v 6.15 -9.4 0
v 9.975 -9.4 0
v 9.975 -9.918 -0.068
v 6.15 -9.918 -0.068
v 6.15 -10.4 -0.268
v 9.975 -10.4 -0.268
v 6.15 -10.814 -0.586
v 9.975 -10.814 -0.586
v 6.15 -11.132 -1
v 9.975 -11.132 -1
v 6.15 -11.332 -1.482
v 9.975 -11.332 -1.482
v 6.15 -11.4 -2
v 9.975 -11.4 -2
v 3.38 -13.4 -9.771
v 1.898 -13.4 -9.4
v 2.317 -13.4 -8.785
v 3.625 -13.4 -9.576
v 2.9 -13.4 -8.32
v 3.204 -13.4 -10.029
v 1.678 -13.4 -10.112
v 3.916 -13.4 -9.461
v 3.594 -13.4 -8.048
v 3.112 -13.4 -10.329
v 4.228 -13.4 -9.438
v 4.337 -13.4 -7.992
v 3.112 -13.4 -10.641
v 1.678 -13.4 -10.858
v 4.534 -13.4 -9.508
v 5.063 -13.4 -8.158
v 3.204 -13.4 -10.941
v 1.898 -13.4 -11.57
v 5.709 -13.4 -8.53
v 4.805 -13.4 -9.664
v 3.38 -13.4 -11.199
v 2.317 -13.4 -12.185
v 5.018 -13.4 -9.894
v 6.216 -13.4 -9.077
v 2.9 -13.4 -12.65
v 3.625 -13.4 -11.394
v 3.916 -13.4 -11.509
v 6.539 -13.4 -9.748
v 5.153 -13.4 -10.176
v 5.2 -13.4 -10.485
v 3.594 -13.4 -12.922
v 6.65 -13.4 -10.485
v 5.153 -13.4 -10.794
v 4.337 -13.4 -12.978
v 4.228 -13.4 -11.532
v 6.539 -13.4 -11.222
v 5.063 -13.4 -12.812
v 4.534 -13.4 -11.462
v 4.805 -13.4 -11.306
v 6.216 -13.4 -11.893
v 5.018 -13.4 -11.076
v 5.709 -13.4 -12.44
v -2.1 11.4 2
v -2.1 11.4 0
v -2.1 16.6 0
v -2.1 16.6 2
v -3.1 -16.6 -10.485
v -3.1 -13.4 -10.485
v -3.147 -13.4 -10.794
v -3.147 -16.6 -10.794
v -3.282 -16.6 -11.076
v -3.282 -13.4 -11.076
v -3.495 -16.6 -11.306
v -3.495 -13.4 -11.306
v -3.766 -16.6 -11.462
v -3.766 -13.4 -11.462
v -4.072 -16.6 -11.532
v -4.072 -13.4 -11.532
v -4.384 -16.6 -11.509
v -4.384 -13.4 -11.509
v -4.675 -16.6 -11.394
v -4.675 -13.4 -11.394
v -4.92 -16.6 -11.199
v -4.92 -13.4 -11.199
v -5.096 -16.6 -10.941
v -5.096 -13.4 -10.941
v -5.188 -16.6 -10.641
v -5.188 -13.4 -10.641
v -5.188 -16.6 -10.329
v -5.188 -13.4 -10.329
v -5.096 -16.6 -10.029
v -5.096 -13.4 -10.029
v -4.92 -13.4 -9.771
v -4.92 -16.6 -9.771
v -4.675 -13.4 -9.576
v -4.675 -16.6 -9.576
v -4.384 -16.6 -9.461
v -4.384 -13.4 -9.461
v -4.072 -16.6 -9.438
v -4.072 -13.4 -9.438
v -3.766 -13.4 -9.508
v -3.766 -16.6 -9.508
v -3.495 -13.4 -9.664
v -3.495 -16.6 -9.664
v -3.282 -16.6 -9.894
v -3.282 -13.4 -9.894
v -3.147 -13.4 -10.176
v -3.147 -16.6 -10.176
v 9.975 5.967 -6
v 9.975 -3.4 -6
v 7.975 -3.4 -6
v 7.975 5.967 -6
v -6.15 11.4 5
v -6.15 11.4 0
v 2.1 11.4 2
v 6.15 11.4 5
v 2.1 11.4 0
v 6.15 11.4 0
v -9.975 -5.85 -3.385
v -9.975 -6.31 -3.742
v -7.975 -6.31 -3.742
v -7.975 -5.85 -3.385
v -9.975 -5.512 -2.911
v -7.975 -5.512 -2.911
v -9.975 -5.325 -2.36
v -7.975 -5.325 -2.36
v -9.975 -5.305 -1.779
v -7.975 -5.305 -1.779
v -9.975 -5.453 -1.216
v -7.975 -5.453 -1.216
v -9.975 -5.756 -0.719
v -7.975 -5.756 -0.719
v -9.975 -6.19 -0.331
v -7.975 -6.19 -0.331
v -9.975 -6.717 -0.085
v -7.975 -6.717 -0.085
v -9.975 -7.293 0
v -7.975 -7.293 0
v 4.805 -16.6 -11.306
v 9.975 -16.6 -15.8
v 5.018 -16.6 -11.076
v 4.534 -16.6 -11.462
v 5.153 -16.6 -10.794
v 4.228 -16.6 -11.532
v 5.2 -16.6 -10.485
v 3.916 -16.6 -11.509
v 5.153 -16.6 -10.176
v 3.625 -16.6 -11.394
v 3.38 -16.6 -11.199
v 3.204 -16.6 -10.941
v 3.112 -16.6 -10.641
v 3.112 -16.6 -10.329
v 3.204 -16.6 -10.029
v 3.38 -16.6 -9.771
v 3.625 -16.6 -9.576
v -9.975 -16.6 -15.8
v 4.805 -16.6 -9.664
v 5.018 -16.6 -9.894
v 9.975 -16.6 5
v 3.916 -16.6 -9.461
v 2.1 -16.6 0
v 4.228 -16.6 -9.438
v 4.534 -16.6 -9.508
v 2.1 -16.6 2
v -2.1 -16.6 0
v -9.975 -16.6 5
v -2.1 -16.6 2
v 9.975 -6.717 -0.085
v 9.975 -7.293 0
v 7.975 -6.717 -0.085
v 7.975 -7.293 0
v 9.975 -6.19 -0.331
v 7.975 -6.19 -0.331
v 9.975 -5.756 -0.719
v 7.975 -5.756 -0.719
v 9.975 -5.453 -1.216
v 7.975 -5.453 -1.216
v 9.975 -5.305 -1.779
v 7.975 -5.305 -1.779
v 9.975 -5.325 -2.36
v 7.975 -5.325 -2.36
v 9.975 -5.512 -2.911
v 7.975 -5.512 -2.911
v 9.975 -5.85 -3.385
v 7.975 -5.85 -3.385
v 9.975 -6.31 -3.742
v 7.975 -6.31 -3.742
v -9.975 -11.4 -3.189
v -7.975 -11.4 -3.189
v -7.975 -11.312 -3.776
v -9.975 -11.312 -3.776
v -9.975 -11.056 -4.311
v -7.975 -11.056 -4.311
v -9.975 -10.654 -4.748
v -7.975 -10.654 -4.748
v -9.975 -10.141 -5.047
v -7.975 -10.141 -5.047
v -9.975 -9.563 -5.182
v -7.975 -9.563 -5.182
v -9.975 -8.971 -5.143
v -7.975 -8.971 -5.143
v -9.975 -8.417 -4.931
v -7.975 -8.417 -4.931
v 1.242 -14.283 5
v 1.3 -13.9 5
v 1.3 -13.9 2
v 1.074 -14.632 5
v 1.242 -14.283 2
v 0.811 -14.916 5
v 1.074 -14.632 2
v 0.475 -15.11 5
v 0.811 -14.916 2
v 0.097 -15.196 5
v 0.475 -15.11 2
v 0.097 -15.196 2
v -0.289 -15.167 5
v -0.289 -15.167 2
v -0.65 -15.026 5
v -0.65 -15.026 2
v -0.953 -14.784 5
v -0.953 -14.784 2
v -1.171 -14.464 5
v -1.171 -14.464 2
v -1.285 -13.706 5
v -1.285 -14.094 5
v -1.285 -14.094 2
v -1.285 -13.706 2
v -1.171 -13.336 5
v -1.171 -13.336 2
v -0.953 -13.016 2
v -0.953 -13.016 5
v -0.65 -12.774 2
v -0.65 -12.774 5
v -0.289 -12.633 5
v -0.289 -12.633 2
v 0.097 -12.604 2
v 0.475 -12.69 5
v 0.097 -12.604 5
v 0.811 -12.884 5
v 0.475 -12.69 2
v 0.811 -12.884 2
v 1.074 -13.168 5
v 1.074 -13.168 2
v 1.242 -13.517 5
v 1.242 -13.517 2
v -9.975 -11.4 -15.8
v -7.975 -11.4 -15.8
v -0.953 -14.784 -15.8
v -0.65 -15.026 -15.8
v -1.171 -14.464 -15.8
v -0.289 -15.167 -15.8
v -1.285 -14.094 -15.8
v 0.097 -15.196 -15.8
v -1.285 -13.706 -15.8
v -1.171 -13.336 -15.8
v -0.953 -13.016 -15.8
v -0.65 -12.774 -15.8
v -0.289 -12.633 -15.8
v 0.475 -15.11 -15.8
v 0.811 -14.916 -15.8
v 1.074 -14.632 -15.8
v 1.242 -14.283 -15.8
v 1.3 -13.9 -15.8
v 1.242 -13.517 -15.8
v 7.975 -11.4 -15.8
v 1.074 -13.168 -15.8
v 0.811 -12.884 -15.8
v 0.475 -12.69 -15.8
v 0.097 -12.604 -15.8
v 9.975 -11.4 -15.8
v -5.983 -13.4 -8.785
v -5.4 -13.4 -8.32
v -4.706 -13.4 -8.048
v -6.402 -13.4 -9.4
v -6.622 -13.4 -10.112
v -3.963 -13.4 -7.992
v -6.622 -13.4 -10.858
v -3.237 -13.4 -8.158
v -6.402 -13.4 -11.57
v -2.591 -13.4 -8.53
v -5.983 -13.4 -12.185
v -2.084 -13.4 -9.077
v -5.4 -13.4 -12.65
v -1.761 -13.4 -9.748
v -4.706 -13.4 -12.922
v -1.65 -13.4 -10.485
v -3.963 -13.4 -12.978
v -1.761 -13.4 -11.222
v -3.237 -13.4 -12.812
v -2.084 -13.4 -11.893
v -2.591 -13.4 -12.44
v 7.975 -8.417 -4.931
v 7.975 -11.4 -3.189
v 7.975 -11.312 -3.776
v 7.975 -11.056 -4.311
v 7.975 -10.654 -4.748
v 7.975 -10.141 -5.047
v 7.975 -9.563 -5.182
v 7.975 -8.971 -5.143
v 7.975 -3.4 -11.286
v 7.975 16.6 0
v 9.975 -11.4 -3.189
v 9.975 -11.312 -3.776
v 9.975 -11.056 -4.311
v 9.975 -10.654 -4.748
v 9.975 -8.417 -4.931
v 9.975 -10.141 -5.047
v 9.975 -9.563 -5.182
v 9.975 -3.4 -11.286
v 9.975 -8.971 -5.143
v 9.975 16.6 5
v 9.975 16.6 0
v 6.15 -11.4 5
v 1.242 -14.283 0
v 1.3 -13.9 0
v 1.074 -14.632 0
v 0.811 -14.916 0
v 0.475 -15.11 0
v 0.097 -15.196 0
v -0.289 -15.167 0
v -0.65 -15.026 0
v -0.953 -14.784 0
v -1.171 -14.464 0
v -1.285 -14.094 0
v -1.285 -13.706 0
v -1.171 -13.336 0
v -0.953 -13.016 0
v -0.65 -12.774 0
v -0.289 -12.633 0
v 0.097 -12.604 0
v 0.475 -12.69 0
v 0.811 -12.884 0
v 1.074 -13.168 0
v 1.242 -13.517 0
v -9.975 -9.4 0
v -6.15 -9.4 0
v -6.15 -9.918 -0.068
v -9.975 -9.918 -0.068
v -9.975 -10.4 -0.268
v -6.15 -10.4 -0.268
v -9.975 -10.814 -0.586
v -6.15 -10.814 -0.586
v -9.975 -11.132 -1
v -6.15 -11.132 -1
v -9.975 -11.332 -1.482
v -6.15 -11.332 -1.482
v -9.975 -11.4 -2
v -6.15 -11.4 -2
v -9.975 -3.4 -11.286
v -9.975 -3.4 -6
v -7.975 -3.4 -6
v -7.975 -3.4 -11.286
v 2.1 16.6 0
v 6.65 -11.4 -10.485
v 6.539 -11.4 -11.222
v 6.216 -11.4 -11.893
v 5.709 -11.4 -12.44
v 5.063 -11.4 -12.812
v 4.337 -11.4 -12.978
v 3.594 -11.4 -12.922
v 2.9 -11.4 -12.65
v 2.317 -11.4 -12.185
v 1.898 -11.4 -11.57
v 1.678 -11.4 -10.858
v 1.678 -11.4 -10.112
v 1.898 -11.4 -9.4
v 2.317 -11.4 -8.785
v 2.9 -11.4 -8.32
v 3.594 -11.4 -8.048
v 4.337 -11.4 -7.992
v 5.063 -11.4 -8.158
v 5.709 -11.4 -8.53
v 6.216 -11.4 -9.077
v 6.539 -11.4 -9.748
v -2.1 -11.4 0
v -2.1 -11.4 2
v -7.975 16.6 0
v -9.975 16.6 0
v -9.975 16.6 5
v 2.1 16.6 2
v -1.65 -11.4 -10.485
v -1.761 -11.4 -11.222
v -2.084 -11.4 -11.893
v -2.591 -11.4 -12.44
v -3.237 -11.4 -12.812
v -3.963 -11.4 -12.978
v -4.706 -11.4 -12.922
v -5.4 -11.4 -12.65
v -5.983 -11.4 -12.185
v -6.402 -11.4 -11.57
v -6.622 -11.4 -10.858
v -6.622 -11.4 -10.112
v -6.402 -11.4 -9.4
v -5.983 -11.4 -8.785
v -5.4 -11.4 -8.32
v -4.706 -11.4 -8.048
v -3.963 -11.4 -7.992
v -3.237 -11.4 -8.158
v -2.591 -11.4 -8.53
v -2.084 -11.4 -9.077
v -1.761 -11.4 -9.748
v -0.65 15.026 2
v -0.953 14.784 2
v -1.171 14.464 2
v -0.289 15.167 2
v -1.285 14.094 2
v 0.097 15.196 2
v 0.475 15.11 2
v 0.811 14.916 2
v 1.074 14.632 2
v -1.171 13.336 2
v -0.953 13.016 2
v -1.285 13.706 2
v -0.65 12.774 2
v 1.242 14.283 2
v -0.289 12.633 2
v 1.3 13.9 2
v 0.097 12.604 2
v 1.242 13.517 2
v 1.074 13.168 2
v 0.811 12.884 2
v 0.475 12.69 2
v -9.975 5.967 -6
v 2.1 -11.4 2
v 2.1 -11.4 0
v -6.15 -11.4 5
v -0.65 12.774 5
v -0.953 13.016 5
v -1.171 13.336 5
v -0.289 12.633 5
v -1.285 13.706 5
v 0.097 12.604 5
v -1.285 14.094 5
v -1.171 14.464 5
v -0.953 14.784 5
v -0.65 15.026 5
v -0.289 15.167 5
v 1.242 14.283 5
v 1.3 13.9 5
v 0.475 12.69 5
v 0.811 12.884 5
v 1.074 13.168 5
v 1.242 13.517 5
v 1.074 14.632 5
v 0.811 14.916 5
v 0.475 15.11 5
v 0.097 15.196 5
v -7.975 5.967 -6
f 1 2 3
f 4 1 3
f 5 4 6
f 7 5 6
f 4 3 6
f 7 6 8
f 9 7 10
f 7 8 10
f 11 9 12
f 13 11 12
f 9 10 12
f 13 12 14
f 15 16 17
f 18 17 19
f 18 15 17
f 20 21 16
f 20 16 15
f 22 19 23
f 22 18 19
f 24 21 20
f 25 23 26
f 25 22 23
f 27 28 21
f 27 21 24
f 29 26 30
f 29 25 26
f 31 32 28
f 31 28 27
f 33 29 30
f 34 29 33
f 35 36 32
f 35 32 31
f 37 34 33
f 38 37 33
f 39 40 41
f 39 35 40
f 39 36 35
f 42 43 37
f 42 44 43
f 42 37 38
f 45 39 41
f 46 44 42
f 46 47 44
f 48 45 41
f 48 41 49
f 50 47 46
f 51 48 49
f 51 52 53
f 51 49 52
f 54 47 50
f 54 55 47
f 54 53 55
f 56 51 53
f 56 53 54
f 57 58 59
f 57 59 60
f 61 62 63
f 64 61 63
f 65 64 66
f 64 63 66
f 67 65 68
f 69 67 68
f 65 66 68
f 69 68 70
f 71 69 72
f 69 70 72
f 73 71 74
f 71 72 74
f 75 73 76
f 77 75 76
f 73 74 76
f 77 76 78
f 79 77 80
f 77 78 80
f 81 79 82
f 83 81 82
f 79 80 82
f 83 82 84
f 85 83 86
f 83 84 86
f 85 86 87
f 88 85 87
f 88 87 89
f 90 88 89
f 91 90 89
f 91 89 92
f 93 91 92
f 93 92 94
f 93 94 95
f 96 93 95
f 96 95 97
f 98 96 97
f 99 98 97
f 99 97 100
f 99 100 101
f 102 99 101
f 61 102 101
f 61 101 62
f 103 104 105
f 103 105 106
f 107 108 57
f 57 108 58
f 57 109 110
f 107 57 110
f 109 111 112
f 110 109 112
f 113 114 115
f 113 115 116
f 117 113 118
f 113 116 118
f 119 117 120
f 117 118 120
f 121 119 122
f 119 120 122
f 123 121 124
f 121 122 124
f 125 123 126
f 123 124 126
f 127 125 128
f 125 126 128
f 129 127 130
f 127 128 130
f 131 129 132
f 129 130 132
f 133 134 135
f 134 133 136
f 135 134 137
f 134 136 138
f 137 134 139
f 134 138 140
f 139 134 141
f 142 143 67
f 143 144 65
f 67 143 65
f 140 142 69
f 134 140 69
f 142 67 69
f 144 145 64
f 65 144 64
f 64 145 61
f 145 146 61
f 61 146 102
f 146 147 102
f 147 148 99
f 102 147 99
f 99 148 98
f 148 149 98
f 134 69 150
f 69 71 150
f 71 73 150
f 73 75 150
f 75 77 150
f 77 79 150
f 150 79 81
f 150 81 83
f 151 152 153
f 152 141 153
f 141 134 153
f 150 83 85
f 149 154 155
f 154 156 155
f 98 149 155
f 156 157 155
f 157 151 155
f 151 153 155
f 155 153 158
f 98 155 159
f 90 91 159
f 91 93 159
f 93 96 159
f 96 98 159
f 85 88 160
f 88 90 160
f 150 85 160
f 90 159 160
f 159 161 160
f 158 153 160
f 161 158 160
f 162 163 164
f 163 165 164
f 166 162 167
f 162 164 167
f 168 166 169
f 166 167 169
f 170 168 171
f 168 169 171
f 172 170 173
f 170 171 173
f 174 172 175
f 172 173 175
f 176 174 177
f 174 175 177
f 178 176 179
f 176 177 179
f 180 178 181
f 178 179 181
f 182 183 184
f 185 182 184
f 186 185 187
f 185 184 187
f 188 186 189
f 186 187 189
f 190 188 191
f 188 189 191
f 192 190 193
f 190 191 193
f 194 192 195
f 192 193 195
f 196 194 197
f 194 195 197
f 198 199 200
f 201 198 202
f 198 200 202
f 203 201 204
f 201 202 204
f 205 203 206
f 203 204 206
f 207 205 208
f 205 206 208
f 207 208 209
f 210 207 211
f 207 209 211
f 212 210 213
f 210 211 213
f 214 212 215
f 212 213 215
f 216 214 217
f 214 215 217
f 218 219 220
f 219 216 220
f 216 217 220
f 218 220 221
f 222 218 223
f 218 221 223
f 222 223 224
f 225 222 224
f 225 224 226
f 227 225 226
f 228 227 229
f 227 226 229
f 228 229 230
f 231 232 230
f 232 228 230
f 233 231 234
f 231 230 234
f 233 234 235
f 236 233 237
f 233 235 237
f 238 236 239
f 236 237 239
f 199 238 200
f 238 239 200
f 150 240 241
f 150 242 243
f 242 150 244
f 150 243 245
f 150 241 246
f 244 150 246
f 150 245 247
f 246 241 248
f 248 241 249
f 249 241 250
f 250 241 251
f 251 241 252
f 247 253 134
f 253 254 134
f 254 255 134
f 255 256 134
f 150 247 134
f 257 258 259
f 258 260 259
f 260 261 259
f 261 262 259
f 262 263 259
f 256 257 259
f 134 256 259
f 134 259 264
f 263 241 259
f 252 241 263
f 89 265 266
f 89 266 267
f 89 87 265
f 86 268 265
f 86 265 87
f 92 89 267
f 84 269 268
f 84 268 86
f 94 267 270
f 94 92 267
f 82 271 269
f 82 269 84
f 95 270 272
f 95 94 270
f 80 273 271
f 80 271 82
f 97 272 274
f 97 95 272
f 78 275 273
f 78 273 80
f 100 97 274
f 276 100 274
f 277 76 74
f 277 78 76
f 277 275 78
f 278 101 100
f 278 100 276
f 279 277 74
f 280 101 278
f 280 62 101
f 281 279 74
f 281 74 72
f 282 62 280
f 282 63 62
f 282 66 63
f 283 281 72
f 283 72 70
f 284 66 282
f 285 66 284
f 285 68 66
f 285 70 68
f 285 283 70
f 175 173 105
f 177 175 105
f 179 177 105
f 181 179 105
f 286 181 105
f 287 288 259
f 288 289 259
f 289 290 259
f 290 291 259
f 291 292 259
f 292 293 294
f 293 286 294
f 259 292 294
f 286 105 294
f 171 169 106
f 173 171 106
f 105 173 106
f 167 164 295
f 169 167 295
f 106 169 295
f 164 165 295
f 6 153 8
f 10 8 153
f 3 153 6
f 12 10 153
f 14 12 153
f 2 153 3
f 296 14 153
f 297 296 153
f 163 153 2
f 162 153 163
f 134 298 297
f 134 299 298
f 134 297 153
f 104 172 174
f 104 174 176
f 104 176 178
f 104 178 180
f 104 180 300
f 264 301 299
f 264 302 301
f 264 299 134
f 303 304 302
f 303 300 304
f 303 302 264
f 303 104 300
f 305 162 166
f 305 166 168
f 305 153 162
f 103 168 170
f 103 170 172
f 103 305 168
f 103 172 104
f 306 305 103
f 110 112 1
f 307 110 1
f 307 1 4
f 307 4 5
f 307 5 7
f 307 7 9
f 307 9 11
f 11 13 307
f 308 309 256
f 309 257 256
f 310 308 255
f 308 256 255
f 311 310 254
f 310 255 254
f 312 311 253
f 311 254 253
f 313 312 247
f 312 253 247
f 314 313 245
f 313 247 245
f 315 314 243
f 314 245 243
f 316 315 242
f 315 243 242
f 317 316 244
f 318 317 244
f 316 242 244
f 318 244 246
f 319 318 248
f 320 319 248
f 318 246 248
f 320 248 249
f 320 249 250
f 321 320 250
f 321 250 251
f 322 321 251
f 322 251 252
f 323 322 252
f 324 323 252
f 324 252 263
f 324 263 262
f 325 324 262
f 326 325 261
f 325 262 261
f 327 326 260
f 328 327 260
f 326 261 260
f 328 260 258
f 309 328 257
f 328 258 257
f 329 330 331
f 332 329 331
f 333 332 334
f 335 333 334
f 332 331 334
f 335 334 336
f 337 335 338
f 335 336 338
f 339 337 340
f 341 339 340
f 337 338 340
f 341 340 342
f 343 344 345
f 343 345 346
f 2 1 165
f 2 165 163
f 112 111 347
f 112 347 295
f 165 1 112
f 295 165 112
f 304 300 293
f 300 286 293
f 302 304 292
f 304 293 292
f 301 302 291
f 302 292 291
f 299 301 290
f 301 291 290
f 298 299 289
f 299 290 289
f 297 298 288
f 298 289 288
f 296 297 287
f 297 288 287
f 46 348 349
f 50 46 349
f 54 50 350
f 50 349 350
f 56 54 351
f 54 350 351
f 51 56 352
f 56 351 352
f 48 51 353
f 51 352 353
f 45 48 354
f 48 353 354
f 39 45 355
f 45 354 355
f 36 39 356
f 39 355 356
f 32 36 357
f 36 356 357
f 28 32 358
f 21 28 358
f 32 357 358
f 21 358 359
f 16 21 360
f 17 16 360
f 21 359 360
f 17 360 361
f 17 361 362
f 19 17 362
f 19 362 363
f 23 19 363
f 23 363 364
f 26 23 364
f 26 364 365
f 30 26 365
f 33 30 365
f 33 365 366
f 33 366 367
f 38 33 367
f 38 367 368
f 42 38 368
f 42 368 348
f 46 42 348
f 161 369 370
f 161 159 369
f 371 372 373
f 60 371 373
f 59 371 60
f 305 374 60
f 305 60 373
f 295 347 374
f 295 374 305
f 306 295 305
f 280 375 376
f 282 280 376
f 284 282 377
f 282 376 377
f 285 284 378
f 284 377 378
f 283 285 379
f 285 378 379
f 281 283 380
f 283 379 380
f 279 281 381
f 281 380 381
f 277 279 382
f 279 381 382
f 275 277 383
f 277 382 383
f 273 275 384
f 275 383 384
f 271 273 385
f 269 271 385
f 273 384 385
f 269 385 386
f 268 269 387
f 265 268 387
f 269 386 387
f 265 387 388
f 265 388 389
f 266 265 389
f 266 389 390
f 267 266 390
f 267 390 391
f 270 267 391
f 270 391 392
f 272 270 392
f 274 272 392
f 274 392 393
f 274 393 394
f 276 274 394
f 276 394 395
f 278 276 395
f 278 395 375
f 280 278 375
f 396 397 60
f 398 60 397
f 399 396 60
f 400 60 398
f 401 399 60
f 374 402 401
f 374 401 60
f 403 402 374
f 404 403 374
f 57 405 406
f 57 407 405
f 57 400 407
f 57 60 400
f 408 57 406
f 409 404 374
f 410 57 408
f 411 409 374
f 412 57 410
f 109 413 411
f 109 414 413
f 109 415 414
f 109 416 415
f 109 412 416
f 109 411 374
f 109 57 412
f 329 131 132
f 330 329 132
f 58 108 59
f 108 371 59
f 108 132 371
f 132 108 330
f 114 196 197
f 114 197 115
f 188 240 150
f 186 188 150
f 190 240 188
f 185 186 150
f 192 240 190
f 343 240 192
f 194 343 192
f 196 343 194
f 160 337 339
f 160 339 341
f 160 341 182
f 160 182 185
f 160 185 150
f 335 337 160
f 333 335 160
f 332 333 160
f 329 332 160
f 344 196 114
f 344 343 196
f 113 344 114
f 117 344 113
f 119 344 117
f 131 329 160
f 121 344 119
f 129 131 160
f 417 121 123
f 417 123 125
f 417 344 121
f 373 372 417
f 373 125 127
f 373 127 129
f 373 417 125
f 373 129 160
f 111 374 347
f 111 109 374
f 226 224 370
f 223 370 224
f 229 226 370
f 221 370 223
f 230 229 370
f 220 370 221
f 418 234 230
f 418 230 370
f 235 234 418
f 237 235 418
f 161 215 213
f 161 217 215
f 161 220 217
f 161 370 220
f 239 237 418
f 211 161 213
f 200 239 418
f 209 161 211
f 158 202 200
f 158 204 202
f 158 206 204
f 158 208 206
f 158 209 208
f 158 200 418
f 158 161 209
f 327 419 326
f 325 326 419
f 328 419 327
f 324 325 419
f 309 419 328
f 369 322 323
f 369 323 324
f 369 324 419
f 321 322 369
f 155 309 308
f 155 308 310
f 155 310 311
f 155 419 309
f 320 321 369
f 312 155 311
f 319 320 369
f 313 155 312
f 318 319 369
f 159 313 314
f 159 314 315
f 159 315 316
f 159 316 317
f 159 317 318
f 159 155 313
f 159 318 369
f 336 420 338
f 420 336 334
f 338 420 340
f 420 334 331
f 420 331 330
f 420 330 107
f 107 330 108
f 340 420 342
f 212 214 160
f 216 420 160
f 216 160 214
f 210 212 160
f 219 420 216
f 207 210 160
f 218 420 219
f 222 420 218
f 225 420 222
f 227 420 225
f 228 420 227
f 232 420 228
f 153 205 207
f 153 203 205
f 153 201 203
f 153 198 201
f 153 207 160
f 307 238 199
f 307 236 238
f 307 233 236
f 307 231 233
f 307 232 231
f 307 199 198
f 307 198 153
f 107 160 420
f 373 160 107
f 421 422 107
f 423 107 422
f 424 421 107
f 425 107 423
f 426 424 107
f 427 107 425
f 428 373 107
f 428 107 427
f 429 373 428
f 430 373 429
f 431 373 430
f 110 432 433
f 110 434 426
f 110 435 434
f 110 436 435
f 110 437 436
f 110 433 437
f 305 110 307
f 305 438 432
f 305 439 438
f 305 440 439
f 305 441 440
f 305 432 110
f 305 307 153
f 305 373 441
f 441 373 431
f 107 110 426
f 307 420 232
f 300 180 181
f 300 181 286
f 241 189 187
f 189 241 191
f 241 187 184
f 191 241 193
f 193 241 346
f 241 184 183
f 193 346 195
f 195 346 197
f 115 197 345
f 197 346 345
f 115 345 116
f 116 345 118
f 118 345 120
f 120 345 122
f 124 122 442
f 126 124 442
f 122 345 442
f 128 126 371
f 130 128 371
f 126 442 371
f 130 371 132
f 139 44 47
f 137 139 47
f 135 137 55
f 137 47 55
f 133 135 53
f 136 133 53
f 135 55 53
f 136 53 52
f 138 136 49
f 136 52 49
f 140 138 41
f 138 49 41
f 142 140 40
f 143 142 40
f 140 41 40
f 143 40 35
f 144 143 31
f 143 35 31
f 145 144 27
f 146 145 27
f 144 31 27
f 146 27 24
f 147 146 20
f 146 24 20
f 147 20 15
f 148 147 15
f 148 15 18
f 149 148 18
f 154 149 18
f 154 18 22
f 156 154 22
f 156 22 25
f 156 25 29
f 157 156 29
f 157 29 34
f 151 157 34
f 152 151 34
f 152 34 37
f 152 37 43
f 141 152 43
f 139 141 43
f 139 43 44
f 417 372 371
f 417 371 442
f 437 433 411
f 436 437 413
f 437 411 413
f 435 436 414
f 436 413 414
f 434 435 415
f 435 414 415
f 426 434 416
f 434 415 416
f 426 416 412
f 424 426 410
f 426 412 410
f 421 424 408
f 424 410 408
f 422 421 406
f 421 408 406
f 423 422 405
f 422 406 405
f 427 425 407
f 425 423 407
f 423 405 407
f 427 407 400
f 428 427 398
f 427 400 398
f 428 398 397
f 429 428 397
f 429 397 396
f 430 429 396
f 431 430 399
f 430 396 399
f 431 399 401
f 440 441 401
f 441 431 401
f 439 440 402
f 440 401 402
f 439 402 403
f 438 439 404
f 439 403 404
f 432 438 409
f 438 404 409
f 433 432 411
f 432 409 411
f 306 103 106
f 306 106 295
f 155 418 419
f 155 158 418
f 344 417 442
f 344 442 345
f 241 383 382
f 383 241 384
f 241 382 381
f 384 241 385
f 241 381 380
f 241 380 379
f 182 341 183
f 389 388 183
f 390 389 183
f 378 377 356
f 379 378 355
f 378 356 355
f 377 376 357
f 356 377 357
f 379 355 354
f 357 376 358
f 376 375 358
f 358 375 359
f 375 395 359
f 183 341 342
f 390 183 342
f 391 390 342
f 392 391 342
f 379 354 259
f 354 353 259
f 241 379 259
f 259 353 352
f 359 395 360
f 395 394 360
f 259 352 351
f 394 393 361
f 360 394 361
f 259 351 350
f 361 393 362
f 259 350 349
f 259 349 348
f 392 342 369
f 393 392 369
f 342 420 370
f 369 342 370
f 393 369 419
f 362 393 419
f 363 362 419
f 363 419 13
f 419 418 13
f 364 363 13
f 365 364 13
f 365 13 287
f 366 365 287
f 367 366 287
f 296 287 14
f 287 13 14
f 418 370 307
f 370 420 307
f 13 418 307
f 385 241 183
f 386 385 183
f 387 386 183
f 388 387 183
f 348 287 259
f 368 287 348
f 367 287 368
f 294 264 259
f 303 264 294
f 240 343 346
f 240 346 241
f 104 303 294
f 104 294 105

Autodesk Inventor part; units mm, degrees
ref_plane "YZ Plane" through (0, 0, 0) normal (1, 0, 0) x (0, 1, 0)
sketch "Sketch1" plane through (0, 0, 0) normal (0, 0, 1) x (1, 0, 0)
  line L0 (-9.975, 16.6) -> (9.975, 16.6)
  line L1 (9.975, 16.6) -> (9.975, -16.6)
  line L2 (9.975, -16.6) -> (-9.975, -16.6)
  line L3 (-9.975, -16.6) -> (-9.975, 16.6)
  line L4 (0, 0) -> (0, 11.4) construction
  line L5 (0, 0) -> (15.5803, 0) construction
  line L6 (-6.15, 11.4) -> (6.15, 11.4)
  line L7 (6.15, 11.4) -> (6.15, -11.4)
  line L8 (6.15, -11.4) -> (-6.15, -11.4)
  line L9 (-6.15, -11.4) -> (-6.15, 11.4)
  circle A0 centre (0, 13.9) radius 1.3
  circle A1 centre (0, -13.9) radius 1.3
  line L10 (-15.0861, 0) -> (20.6914, 0) projected
  line L11 (9.975, -16.6) -> (-9.975, -16.6)
  line L12 (-9.975, -16.6) -> (-9.975, -11.4)
  line L13 (-9.975, -11.4) -> (9.975, -11.4)
  line L14 (9.975, -11.4) -> (9.975, -16.6)
  line L15 (0, 11.4) -> (0, 13.9) construction
  point P0 (0, 16.6)
  dimension "d0" = 2.6
  dimension "d1" = 27.8
  dimension "d4" = 12.3
  dimension "d5" = 2.5
  dimension "d6" = 2.5
  dimension "d7" = 22.8
  dimension "d11" = 2.7
  dimension "d12" = 2.7
  dimension "d14" = 3.825
extrude "Extrusion1" add sketch "Sketch1" along normal blind 5 contours L0 L1 L10 L7 L6 L9 L3 | L10 L9 L13 L3 | L1 L13 L7 L10 | L13 L8 L1 L2 L3
extrude "Extrusion2" add sketch "Sketch1" against normal blind 15.8 contours L13 L8 L1 L2 L3
sketch "Sketch2" plane through (-6.15, -11.4, 5) normal (0, 1, 0) x (1, 0, 0)
  circle A0 centre (10.3, 15.485) radius 1.05
  circle A1 centre (2, 15.485) radius 1.05
  line L0 (-3.825, 20.8) -> (16.125, 20.8) projected
  line L1 (-3.825, 5) -> (-3.825, 20.8) projected
  line L2 (2, 15.485) -> (10.3, 15.485) construction
  line L3 (10.3, 15.485) -> (6.15, 15.485) construction
  line L4 (6.15, 15.485) -> (6.15, 20.8) construction
  point P0 (6.15, 5)
  dimension "d19" = 2.1
  dimension "d20" = 0
  dimension "d21" = 5.315
  dimension "d22" = 8.3
extrude "Extrusion3" cut sketch "Sketch2" against normal blind 10
sketch "Sketch3" plane through (-6.15, -11.4, 5) normal (0, 1, 0) x (1, 0, 0)
  circle A0 centre (10.3, 15.485) radius 1.05 projected
  circle A1 centre (10.3, 15.485) radius 2.5
  circle A2 centre (2, 15.485) radius 1.05 projected
  circle A3 centre (2, 15.485) radius 2.5
  point P0 (6.15, 5)
  dimension "d26" = 5
extrude "Extrusion4" cut sketch "Sketch3" against normal blind 2
sketch "Sketch4" plane through (9.975, -11.4, 0) normal (1, 0, 0) x (0, 0, -1)
  line L0 (0, 0) -> (15.8, 0) projected
  line L1 (0, 0) -> (0, 28) projected
  line L2 (15.8, 0) -> (0, 28)
  line L3 (0, 28) -> (0, 11.7214)
  line L4 (0, 11.7214) -> (6.6142, 0)
  line L5 (6.6142, 0) -> (15.8, 0)
  line L6 (0, 28) -> (-5, 28) projected
  line L7 (0, 11.7214) -> (0, 28)
  line L8 (6, 17.3671) -> (11.2857, 17.3671)
  line L9 (11.2857, 17.3671) -> (11.2857, 8)
  line L10 (11.2857, 8) -> (6, 8)
  line L11 (6, 8) -> (6, 17.3671)
  point P0 (0, 11.4)
  dimension "d29" = 8
  dimension "d33" = 8
  dimension "d34" = 6
ref_plane "Work Plane1" through (-1.325, -11.4, 0) normal (-1, 0, 0) x (0, 0, 1)
extrude "Extrusion5" add sketch "Sketch4" against normal blind 2 contours L4 L1 L2 L11 L10 L0
ref_plane "Work Plane3" through (0, -16.6, 5) normal (-1, 0, 0) x (0, 0, 1)
mirror "Mirror1" about plane through (0, -16.6, 5) normal (-1, 0, 0) of "Extrusion5"
fillet "Fillet1" radius 2 6 edges at (8.975, 0.3214, 0) (8.975, -11.4, -6.6142) (8.0625, -11.4, 0) (-8.975, -11.4, -6.6142) (-8.0625, -11.4, 0) (-8.975, 0.3214, 0)
sketch "Sketch5" plane through (-9.975, -16.6, 5) normal (0, -1, 0) x (1, 0, 0)
  line L0 (0, 0) -> (19.95, 0) projected
  line L1 (7.875, -3) -> (12.075, -3)
  line L2 (12.075, -3) -> (12.075, -5)
  line L3 (12.075, -5) -> (7.875, -5)
  line L4 (7.875, -5) -> (7.875, -3)
  line L5 (9.975, 0) -> (9.975, -3) construction
  point P0 (9.975, -5)
  dimension "d39" = 4.2
  dimension "d40" = 3
  dimension "d41" = 2
extrude "Extrusion7" cut sketch "Sketch5" against normal through all
properties part number "GrabberServoHolder_3DPrint"
